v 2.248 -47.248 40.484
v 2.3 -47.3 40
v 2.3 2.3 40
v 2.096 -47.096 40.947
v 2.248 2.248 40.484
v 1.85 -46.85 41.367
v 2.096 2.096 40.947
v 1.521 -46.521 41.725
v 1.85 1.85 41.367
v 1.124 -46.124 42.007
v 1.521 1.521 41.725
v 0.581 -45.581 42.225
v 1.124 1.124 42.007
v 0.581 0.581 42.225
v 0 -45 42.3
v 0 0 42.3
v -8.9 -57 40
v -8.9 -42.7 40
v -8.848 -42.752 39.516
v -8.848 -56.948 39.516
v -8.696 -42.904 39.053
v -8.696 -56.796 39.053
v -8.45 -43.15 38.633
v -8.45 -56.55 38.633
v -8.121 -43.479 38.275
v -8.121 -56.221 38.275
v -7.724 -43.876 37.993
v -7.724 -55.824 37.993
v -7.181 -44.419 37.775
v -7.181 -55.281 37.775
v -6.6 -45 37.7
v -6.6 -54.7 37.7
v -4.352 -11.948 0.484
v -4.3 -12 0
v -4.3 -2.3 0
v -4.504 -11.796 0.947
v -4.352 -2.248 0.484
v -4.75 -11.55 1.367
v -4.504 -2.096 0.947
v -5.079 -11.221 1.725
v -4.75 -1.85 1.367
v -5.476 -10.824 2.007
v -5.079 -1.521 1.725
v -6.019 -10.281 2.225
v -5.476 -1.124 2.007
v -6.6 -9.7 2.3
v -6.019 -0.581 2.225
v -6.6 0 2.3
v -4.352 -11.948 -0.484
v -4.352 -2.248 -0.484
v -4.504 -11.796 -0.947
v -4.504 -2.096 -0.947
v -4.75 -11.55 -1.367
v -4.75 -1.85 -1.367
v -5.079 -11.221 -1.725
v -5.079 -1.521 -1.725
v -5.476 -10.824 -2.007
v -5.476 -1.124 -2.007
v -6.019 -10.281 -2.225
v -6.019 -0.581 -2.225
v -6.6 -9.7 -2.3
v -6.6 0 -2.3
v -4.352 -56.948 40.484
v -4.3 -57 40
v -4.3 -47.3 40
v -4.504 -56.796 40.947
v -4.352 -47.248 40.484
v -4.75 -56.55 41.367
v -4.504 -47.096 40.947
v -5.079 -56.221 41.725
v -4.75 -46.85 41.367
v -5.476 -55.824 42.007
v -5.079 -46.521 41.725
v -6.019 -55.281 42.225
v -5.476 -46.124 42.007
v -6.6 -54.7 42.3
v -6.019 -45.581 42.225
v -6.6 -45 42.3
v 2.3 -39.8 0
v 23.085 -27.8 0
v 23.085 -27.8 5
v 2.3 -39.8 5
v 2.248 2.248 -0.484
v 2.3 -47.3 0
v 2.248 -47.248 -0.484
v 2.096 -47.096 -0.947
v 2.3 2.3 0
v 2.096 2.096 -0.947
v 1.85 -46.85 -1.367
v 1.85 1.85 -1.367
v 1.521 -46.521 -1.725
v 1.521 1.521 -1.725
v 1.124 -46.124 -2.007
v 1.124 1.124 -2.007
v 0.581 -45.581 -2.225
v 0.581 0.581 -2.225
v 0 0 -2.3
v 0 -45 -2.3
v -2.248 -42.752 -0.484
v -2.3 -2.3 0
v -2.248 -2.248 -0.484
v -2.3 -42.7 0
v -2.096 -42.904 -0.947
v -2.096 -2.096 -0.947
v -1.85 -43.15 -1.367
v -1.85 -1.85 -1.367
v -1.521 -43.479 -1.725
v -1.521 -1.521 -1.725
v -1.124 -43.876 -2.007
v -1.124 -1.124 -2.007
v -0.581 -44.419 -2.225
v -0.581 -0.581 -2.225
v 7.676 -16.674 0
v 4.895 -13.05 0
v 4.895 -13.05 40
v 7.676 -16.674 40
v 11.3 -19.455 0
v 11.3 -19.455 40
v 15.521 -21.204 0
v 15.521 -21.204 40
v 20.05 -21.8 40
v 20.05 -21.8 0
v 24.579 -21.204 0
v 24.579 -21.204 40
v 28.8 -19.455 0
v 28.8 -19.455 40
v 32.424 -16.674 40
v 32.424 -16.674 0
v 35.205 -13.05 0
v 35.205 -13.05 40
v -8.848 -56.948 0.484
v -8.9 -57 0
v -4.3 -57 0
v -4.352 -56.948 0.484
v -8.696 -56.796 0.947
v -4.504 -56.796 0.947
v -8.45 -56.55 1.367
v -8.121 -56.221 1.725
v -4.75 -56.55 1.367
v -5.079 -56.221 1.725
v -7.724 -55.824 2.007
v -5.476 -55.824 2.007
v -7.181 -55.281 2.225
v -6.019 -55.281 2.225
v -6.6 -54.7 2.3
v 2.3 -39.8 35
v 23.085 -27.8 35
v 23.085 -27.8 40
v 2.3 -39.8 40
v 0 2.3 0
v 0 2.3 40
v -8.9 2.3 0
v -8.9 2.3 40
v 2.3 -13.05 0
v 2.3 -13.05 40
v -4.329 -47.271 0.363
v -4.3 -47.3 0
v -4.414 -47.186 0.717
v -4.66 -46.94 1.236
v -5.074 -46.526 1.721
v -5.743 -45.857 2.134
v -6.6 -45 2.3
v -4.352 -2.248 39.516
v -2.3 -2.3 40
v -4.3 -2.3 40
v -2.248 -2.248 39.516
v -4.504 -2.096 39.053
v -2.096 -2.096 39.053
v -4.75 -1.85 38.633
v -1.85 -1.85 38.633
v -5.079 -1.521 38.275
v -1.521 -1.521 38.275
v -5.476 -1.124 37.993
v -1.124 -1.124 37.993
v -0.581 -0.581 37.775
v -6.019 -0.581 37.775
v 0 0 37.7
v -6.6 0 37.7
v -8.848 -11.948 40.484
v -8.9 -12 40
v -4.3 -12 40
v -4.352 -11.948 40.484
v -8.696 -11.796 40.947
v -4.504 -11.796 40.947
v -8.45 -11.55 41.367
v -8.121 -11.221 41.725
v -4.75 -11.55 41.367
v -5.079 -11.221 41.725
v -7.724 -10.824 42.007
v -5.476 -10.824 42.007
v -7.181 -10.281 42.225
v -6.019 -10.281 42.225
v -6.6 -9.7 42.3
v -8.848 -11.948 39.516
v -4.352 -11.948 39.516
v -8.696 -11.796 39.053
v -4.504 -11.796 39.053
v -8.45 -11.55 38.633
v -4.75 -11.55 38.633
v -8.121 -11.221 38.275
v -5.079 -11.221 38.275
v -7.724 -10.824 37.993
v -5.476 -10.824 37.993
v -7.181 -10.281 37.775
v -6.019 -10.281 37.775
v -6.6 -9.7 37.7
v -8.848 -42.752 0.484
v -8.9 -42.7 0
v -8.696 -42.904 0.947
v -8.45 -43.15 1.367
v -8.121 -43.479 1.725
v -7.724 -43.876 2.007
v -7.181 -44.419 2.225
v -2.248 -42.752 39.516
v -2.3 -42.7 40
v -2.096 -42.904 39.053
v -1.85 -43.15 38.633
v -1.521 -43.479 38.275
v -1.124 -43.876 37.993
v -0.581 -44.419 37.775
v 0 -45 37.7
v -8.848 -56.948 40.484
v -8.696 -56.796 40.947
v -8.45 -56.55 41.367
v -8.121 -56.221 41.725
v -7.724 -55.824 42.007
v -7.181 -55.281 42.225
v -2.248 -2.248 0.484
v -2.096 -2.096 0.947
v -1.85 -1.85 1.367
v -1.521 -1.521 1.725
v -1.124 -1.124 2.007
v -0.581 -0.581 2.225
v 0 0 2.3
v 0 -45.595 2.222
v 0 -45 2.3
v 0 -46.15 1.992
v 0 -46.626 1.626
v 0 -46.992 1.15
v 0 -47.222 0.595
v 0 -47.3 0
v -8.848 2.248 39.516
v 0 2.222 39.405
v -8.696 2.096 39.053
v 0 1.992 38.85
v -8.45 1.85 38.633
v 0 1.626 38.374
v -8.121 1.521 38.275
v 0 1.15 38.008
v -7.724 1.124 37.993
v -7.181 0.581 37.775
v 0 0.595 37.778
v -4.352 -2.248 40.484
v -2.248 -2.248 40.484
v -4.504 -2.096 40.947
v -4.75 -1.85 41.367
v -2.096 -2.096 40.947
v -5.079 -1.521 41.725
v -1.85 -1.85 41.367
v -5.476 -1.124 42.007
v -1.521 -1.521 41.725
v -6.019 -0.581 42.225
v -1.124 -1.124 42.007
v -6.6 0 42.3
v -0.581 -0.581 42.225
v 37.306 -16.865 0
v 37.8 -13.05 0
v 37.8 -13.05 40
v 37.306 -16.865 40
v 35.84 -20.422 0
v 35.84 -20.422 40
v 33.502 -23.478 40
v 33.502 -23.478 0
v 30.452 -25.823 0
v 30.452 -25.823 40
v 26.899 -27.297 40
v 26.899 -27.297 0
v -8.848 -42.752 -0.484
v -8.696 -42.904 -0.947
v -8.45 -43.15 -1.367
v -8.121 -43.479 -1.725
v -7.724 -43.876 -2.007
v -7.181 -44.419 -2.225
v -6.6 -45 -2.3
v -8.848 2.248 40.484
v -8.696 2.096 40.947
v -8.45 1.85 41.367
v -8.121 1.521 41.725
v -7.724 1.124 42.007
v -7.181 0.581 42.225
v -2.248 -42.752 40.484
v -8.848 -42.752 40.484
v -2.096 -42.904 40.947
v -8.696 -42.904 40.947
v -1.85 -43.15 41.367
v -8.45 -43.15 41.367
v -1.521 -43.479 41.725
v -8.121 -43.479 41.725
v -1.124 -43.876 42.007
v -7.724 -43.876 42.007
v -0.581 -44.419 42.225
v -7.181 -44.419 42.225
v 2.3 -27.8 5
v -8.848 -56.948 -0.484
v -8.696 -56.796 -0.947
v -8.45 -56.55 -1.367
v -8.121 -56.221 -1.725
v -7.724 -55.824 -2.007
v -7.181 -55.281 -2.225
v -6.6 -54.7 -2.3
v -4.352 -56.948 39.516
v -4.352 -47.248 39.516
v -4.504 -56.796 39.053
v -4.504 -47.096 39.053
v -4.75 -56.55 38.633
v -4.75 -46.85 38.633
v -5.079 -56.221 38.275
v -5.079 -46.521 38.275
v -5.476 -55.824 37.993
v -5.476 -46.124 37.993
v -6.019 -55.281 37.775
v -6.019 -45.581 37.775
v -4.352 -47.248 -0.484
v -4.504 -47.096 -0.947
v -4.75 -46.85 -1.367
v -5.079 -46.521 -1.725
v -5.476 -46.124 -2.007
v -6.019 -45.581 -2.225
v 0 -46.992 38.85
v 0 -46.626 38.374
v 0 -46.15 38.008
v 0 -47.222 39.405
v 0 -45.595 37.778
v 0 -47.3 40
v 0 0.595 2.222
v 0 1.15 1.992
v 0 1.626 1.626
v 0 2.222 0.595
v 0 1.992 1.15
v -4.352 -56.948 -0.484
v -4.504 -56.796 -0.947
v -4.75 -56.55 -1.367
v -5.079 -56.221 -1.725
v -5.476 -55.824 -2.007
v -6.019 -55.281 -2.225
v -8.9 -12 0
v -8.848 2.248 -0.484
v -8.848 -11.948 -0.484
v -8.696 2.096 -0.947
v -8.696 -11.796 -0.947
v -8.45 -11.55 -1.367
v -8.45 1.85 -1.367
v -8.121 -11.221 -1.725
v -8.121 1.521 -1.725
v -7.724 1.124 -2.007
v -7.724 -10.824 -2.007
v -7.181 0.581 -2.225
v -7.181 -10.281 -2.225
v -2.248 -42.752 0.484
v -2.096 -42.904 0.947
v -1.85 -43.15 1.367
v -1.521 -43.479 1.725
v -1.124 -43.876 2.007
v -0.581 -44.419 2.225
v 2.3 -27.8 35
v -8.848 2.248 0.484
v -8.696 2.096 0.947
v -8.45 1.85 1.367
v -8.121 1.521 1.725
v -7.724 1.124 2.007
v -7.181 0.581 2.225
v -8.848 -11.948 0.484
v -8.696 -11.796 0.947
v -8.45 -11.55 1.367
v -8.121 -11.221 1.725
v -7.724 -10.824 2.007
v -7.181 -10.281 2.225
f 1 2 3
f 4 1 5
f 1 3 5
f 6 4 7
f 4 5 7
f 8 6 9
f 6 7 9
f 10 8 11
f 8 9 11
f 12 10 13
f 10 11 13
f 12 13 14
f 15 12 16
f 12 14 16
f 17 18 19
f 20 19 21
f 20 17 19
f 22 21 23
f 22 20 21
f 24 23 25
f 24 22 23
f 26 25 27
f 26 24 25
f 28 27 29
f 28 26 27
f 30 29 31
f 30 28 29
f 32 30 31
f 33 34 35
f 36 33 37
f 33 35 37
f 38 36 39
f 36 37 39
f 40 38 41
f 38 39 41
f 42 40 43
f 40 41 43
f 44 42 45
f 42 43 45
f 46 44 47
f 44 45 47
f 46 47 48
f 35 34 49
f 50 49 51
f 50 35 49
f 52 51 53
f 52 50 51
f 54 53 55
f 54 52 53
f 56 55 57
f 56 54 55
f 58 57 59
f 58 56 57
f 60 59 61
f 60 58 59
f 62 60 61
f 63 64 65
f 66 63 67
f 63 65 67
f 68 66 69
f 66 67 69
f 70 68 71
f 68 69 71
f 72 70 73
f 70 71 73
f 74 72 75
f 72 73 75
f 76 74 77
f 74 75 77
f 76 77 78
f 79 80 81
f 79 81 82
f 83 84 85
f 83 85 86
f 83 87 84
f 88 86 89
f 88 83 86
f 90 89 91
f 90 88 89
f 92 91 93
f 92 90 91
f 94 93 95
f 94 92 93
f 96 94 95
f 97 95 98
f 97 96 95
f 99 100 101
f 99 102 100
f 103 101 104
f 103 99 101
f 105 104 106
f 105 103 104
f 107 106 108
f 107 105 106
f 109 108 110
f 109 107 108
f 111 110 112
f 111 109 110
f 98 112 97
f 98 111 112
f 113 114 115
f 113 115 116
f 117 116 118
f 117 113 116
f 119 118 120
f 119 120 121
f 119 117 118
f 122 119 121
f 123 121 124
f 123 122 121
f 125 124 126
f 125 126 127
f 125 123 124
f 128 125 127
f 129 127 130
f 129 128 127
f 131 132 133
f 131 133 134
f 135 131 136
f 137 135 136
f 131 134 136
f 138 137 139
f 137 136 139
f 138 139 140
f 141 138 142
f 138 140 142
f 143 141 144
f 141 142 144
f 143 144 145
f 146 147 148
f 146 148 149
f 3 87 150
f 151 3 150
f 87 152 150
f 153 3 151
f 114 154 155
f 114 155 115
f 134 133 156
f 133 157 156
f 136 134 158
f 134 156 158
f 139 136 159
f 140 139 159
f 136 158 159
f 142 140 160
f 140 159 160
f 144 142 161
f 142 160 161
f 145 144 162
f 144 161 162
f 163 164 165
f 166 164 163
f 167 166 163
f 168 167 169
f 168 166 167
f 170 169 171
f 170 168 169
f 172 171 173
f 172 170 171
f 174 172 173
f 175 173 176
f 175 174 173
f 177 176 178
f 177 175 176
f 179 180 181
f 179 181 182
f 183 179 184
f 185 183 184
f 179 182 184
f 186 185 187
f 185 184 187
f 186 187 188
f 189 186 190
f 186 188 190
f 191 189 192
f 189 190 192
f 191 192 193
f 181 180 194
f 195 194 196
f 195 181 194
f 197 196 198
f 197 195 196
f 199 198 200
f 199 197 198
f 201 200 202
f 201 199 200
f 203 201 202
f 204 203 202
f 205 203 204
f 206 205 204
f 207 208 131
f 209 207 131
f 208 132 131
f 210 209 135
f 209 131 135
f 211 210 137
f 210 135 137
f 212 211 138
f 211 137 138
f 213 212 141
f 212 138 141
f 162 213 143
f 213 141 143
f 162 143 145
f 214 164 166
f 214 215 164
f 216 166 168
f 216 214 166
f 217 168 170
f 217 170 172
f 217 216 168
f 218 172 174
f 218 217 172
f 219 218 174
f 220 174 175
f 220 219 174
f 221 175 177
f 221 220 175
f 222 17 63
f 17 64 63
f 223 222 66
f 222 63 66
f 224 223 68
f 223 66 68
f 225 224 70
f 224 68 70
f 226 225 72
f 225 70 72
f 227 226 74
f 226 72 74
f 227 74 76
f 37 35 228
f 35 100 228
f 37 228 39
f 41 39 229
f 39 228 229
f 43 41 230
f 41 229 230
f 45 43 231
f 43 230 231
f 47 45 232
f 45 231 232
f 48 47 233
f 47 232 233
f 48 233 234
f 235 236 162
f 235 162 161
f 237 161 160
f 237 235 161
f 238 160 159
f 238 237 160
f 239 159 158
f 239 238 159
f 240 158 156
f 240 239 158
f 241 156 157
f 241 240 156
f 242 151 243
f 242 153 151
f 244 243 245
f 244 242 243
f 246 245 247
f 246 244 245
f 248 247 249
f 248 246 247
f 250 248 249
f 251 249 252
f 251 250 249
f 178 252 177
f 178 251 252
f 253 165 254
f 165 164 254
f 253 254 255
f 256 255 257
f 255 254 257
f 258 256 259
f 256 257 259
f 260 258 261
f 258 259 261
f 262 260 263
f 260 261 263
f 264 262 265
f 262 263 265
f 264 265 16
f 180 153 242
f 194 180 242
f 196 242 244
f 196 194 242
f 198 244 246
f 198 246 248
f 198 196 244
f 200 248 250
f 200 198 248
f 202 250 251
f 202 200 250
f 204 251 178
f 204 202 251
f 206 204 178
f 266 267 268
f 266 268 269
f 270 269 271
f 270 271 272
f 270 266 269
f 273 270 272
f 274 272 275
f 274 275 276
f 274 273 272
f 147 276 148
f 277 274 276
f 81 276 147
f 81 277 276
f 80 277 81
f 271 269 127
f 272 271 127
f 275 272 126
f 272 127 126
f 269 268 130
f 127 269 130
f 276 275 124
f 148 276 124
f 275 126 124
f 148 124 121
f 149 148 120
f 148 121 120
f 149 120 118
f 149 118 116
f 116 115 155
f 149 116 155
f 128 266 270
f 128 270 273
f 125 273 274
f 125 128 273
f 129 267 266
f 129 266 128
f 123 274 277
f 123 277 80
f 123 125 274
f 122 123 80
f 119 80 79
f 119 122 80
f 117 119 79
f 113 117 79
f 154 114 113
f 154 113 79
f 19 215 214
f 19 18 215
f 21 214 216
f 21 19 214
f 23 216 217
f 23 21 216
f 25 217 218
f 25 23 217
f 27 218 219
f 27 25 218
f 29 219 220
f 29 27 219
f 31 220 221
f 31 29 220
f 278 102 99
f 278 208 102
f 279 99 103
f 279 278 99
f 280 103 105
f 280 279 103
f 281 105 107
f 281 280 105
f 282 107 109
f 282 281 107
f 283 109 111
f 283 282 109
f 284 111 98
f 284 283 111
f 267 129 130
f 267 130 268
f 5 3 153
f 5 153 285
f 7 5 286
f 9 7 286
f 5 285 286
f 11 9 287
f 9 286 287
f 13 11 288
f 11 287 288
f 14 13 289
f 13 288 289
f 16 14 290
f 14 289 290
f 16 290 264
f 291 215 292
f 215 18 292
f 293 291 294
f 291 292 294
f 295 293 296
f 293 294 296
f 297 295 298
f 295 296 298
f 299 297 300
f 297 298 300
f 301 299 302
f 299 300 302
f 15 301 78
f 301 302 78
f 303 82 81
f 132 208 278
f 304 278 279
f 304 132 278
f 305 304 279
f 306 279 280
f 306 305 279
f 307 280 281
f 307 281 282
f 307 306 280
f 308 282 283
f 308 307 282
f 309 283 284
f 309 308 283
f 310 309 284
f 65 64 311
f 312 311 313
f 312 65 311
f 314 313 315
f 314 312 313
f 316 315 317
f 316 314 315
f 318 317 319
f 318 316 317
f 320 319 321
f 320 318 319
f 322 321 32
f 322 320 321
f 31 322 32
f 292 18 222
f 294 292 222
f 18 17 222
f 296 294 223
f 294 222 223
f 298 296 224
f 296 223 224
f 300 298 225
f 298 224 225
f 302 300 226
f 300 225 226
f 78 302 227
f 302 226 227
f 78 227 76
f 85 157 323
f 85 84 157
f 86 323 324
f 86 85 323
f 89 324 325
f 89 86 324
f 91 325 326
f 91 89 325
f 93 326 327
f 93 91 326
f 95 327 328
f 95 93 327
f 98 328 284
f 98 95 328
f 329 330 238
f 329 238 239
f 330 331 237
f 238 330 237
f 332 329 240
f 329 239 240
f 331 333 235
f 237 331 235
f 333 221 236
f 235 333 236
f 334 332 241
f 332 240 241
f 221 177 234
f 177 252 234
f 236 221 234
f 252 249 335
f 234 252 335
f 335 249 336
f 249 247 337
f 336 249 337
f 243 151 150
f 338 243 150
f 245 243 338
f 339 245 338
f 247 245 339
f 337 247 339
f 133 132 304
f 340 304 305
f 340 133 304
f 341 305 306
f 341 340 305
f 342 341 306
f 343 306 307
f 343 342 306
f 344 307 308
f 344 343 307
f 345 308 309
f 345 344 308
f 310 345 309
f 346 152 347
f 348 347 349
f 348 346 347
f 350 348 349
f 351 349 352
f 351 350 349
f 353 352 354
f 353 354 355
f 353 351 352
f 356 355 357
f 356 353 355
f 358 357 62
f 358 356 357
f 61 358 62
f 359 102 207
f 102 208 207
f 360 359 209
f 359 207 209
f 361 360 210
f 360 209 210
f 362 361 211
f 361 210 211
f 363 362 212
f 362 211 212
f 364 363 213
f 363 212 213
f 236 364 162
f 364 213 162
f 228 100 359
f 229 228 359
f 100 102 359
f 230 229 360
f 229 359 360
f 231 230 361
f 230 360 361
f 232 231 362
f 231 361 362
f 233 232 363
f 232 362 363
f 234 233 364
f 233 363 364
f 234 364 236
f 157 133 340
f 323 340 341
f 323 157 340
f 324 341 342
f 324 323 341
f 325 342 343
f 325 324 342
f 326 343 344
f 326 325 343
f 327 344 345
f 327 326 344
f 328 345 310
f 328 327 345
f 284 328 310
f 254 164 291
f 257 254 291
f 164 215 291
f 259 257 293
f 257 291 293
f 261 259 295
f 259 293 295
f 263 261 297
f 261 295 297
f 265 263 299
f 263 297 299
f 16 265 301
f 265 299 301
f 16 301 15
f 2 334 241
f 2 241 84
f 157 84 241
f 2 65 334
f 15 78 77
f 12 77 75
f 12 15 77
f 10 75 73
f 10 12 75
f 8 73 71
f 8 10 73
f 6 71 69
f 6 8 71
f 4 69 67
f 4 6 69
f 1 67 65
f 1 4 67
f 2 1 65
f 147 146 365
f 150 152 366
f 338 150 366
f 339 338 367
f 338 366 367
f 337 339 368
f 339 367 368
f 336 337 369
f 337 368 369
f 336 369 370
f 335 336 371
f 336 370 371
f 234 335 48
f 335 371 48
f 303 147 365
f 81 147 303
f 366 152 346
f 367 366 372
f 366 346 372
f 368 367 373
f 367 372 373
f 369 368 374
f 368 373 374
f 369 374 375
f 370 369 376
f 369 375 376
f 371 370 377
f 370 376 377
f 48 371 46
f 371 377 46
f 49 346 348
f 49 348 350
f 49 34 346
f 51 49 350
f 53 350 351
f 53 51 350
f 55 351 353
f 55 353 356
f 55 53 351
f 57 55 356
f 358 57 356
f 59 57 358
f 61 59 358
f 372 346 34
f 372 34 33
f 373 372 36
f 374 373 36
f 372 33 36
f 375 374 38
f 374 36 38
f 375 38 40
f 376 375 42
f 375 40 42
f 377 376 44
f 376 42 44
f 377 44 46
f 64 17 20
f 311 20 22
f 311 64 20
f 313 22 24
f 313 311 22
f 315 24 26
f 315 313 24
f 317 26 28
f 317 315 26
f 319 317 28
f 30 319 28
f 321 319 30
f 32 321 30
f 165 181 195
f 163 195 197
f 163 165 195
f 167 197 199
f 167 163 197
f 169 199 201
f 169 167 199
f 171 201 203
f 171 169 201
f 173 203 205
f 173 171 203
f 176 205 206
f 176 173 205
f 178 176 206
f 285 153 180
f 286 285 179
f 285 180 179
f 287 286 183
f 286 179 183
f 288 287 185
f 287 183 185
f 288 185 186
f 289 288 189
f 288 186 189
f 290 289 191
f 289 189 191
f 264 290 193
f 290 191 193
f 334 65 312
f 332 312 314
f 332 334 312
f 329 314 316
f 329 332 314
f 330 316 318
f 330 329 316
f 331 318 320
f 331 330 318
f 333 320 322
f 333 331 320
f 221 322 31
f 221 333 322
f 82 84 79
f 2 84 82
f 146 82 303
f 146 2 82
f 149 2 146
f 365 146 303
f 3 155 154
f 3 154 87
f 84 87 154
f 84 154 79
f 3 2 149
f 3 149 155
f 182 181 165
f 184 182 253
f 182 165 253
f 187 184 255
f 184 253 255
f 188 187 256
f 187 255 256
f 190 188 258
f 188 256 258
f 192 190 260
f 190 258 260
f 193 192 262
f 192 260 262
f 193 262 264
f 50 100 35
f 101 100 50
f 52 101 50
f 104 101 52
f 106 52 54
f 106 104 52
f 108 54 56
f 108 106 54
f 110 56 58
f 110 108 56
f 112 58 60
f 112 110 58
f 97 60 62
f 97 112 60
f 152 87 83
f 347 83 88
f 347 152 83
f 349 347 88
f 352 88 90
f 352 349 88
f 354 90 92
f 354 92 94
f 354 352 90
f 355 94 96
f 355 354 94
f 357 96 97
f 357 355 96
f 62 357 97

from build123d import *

# Parameters (mm, degrees)
EXTRU_MINCE1_DEPTH         = 2.3
CONG_1_R                   = 2.3
ESQUISSE2_W                = 40
ESQUISSE2_H                = 49.6
BOSS_EXTRU_1_DEPTH         = 2.3
R_P_TITION_LIN_AIRE1_COUNT = 2
R_P_TITION_LIN_AIRE1_PITCH = 40
CONG_2_R                   = 2.3
BOSS_EXTRU_2_DEPTH         = 40
ENL_V_START                = 37.8
ESQUISSE4_W                = 30
ESQUISSE4_H                = 12
ENL_V_MAT_EXTRU_1_DEPTH    = 35.5


with BuildPart() as part:
    # Esquisse1 → Extru.-Mince1 (new, symmetric)
    with BuildSketch(Plane.XY):
        Polygon((-4.3, -57), (-4.3, -47.3), (2.3, -47.3), (2.3, 2.3), (-8.9, 2.3), (-8.9, -12), (-4.3, -12), (-4.3, -2.3), (-2.3, -2.3), (-2.3, -42.7), (-8.9, -42.7), (-8.9, -57), align=None)
    extru_mince1 = extrude(amount=EXTRU_MINCE1_DEPTH, both=True)

    # Congé1
    cong_1_edges = [part.edges().sort_by_distance(p)[0] for p in [
        (-6.6, -57, -2.3),
        (-4.3, -52.15, -2.3),
        (-1, -47.3, -2.3),
        (2.3, -22.5, -2.3),
        (-3.3, 2.3, -2.3),
        (-8.9, -4.85, -2.3),
        (-6.6, -12, -2.3),
        (-4.3, -7.15, -2.3),
        (-3.3, -2.3, -2.3),
        (-2.3, -22.5, -2.3),
        (-5.6, -42.7, -2.3),
        (-8.9, -49.85, -2.3),
        (-5.6, -42.7, 2.3),
        (-2.3, -22.5, 2.3),
        (-3.3, -2.3, 2.3),
        (-4.3, -7.15, 2.3),
        (-6.6, -12, 2.3),
        (-8.9, -4.85, 2.3),
        (-3.3, 2.3, 2.3),
        (2.3, -22.5, 2.3),
        (-1, -47.3, 2.3),
        (-4.3, -52.15, 2.3),
        (-6.6, -57, 2.3),
        (-8.9, -49.85, 2.3),
    ]]
    fillet(cong_1_edges, radius=CONG_1_R - 0.0001)  # a hair under: the kernel refuses the full size

    # Esquisse2 → Boss.-Extru.1 (add)
    with BuildSketch(Plane(origin=(0, 0, 0), x_dir=(0, 0, -1), z_dir=(1, 0, 0))):
        with Locations((-20, -22.5)):
            Rectangle(ESQUISSE2_W, ESQUISSE2_H)
    extrude(amount=BOSS_EXTRU_1_DEPTH)

    # Répétition linéaire1: Extru.-Mince1 ×2
    with Locations(*[(0, 0, i * R_P_TITION_LIN_AIRE1_PITCH) for i in range(1, R_P_TITION_LIN_AIRE1_COUNT)]):
        add(extru_mince1)

    # Congé2
    cong_2_edges = [part.edges().sort_by_distance(p)[0] for p in [
        (-5.6, -42.7, 42.3),
        (-2.3, -22.5, 42.3),
        (-3.3, -2.3, 42.3),
        (-4.3, -7.15, 42.3),
        (-6.6, -12, 42.3),
        (-8.9, -4.85, 42.3),
        (-3.3, 2.3, 42.3),
        (2.3, -22.5, 42.3),
        (-6.6, -57, 42.3),
        (-4.3, -52.15, 42.3),
        (-1, -47.3, 42.3),
        (-8.9, -49.85, 42.3),
        (-2.15, -47.3, 37.7),
        (-4.3, -52.15, 37.7),
        (-6.6, -57, 37.7),
        (-8.9, -49.85, 37.7),
        (-5.6, -42.7, 37.7),
        (-2.3, -22.5, 37.7),
        (-3.3, -2.3, 37.7),
        (-4.3, -7.15, 37.7),
        (-6.6, -12, 37.7),
        (-8.9, -4.85, 37.7),
        (-4.45, 2.3, 37.7),
    ]]
    fillet(cong_2_edges, radius=CONG_2_R - 0.0001)  # a hair under: the kernel refuses the full size

    # Esquisse3 → Boss.-Extru.2 (add)
    with BuildSketch(Plane.XY):
        with BuildLine():
            Line((2.3, -39.8), (2.3, -13.05))
            Line((2.3, -13.05), (4.894555434, -13.05))
            ThreePointArc((4.894555434, -13.05), (20.05, -21.8), (35.205444566, -13.05))
            Line((35.205444566, -13.05), (37.8, -13.05))
            ThreePointArc((37.8, -13.05), (33.502205526, -23.477720869), (23.084609691, -27.8))
            Line((23.084609691, -27.8), (2.3, -39.8))
        make_face()
    extrude(amount=BOSS_EXTRU_2_DEPTH)

    # Esquisse4 → Enlèv. mat.-Extru.1 (cut)
    with BuildSketch(Plane(origin=(0, 0, 0), x_dir=(0, 0, -1), z_dir=(1, 0, 0)).offset(ENL_V_START)):
        with Locations((-20, -33.8)):
            Rectangle(ESQUISSE4_W, ESQUISSE4_H)
    extrude(amount=-ENL_V_MAT_EXTRU_1_DEPTH, mode=Mode.SUBTRACT)


solid = part.part
